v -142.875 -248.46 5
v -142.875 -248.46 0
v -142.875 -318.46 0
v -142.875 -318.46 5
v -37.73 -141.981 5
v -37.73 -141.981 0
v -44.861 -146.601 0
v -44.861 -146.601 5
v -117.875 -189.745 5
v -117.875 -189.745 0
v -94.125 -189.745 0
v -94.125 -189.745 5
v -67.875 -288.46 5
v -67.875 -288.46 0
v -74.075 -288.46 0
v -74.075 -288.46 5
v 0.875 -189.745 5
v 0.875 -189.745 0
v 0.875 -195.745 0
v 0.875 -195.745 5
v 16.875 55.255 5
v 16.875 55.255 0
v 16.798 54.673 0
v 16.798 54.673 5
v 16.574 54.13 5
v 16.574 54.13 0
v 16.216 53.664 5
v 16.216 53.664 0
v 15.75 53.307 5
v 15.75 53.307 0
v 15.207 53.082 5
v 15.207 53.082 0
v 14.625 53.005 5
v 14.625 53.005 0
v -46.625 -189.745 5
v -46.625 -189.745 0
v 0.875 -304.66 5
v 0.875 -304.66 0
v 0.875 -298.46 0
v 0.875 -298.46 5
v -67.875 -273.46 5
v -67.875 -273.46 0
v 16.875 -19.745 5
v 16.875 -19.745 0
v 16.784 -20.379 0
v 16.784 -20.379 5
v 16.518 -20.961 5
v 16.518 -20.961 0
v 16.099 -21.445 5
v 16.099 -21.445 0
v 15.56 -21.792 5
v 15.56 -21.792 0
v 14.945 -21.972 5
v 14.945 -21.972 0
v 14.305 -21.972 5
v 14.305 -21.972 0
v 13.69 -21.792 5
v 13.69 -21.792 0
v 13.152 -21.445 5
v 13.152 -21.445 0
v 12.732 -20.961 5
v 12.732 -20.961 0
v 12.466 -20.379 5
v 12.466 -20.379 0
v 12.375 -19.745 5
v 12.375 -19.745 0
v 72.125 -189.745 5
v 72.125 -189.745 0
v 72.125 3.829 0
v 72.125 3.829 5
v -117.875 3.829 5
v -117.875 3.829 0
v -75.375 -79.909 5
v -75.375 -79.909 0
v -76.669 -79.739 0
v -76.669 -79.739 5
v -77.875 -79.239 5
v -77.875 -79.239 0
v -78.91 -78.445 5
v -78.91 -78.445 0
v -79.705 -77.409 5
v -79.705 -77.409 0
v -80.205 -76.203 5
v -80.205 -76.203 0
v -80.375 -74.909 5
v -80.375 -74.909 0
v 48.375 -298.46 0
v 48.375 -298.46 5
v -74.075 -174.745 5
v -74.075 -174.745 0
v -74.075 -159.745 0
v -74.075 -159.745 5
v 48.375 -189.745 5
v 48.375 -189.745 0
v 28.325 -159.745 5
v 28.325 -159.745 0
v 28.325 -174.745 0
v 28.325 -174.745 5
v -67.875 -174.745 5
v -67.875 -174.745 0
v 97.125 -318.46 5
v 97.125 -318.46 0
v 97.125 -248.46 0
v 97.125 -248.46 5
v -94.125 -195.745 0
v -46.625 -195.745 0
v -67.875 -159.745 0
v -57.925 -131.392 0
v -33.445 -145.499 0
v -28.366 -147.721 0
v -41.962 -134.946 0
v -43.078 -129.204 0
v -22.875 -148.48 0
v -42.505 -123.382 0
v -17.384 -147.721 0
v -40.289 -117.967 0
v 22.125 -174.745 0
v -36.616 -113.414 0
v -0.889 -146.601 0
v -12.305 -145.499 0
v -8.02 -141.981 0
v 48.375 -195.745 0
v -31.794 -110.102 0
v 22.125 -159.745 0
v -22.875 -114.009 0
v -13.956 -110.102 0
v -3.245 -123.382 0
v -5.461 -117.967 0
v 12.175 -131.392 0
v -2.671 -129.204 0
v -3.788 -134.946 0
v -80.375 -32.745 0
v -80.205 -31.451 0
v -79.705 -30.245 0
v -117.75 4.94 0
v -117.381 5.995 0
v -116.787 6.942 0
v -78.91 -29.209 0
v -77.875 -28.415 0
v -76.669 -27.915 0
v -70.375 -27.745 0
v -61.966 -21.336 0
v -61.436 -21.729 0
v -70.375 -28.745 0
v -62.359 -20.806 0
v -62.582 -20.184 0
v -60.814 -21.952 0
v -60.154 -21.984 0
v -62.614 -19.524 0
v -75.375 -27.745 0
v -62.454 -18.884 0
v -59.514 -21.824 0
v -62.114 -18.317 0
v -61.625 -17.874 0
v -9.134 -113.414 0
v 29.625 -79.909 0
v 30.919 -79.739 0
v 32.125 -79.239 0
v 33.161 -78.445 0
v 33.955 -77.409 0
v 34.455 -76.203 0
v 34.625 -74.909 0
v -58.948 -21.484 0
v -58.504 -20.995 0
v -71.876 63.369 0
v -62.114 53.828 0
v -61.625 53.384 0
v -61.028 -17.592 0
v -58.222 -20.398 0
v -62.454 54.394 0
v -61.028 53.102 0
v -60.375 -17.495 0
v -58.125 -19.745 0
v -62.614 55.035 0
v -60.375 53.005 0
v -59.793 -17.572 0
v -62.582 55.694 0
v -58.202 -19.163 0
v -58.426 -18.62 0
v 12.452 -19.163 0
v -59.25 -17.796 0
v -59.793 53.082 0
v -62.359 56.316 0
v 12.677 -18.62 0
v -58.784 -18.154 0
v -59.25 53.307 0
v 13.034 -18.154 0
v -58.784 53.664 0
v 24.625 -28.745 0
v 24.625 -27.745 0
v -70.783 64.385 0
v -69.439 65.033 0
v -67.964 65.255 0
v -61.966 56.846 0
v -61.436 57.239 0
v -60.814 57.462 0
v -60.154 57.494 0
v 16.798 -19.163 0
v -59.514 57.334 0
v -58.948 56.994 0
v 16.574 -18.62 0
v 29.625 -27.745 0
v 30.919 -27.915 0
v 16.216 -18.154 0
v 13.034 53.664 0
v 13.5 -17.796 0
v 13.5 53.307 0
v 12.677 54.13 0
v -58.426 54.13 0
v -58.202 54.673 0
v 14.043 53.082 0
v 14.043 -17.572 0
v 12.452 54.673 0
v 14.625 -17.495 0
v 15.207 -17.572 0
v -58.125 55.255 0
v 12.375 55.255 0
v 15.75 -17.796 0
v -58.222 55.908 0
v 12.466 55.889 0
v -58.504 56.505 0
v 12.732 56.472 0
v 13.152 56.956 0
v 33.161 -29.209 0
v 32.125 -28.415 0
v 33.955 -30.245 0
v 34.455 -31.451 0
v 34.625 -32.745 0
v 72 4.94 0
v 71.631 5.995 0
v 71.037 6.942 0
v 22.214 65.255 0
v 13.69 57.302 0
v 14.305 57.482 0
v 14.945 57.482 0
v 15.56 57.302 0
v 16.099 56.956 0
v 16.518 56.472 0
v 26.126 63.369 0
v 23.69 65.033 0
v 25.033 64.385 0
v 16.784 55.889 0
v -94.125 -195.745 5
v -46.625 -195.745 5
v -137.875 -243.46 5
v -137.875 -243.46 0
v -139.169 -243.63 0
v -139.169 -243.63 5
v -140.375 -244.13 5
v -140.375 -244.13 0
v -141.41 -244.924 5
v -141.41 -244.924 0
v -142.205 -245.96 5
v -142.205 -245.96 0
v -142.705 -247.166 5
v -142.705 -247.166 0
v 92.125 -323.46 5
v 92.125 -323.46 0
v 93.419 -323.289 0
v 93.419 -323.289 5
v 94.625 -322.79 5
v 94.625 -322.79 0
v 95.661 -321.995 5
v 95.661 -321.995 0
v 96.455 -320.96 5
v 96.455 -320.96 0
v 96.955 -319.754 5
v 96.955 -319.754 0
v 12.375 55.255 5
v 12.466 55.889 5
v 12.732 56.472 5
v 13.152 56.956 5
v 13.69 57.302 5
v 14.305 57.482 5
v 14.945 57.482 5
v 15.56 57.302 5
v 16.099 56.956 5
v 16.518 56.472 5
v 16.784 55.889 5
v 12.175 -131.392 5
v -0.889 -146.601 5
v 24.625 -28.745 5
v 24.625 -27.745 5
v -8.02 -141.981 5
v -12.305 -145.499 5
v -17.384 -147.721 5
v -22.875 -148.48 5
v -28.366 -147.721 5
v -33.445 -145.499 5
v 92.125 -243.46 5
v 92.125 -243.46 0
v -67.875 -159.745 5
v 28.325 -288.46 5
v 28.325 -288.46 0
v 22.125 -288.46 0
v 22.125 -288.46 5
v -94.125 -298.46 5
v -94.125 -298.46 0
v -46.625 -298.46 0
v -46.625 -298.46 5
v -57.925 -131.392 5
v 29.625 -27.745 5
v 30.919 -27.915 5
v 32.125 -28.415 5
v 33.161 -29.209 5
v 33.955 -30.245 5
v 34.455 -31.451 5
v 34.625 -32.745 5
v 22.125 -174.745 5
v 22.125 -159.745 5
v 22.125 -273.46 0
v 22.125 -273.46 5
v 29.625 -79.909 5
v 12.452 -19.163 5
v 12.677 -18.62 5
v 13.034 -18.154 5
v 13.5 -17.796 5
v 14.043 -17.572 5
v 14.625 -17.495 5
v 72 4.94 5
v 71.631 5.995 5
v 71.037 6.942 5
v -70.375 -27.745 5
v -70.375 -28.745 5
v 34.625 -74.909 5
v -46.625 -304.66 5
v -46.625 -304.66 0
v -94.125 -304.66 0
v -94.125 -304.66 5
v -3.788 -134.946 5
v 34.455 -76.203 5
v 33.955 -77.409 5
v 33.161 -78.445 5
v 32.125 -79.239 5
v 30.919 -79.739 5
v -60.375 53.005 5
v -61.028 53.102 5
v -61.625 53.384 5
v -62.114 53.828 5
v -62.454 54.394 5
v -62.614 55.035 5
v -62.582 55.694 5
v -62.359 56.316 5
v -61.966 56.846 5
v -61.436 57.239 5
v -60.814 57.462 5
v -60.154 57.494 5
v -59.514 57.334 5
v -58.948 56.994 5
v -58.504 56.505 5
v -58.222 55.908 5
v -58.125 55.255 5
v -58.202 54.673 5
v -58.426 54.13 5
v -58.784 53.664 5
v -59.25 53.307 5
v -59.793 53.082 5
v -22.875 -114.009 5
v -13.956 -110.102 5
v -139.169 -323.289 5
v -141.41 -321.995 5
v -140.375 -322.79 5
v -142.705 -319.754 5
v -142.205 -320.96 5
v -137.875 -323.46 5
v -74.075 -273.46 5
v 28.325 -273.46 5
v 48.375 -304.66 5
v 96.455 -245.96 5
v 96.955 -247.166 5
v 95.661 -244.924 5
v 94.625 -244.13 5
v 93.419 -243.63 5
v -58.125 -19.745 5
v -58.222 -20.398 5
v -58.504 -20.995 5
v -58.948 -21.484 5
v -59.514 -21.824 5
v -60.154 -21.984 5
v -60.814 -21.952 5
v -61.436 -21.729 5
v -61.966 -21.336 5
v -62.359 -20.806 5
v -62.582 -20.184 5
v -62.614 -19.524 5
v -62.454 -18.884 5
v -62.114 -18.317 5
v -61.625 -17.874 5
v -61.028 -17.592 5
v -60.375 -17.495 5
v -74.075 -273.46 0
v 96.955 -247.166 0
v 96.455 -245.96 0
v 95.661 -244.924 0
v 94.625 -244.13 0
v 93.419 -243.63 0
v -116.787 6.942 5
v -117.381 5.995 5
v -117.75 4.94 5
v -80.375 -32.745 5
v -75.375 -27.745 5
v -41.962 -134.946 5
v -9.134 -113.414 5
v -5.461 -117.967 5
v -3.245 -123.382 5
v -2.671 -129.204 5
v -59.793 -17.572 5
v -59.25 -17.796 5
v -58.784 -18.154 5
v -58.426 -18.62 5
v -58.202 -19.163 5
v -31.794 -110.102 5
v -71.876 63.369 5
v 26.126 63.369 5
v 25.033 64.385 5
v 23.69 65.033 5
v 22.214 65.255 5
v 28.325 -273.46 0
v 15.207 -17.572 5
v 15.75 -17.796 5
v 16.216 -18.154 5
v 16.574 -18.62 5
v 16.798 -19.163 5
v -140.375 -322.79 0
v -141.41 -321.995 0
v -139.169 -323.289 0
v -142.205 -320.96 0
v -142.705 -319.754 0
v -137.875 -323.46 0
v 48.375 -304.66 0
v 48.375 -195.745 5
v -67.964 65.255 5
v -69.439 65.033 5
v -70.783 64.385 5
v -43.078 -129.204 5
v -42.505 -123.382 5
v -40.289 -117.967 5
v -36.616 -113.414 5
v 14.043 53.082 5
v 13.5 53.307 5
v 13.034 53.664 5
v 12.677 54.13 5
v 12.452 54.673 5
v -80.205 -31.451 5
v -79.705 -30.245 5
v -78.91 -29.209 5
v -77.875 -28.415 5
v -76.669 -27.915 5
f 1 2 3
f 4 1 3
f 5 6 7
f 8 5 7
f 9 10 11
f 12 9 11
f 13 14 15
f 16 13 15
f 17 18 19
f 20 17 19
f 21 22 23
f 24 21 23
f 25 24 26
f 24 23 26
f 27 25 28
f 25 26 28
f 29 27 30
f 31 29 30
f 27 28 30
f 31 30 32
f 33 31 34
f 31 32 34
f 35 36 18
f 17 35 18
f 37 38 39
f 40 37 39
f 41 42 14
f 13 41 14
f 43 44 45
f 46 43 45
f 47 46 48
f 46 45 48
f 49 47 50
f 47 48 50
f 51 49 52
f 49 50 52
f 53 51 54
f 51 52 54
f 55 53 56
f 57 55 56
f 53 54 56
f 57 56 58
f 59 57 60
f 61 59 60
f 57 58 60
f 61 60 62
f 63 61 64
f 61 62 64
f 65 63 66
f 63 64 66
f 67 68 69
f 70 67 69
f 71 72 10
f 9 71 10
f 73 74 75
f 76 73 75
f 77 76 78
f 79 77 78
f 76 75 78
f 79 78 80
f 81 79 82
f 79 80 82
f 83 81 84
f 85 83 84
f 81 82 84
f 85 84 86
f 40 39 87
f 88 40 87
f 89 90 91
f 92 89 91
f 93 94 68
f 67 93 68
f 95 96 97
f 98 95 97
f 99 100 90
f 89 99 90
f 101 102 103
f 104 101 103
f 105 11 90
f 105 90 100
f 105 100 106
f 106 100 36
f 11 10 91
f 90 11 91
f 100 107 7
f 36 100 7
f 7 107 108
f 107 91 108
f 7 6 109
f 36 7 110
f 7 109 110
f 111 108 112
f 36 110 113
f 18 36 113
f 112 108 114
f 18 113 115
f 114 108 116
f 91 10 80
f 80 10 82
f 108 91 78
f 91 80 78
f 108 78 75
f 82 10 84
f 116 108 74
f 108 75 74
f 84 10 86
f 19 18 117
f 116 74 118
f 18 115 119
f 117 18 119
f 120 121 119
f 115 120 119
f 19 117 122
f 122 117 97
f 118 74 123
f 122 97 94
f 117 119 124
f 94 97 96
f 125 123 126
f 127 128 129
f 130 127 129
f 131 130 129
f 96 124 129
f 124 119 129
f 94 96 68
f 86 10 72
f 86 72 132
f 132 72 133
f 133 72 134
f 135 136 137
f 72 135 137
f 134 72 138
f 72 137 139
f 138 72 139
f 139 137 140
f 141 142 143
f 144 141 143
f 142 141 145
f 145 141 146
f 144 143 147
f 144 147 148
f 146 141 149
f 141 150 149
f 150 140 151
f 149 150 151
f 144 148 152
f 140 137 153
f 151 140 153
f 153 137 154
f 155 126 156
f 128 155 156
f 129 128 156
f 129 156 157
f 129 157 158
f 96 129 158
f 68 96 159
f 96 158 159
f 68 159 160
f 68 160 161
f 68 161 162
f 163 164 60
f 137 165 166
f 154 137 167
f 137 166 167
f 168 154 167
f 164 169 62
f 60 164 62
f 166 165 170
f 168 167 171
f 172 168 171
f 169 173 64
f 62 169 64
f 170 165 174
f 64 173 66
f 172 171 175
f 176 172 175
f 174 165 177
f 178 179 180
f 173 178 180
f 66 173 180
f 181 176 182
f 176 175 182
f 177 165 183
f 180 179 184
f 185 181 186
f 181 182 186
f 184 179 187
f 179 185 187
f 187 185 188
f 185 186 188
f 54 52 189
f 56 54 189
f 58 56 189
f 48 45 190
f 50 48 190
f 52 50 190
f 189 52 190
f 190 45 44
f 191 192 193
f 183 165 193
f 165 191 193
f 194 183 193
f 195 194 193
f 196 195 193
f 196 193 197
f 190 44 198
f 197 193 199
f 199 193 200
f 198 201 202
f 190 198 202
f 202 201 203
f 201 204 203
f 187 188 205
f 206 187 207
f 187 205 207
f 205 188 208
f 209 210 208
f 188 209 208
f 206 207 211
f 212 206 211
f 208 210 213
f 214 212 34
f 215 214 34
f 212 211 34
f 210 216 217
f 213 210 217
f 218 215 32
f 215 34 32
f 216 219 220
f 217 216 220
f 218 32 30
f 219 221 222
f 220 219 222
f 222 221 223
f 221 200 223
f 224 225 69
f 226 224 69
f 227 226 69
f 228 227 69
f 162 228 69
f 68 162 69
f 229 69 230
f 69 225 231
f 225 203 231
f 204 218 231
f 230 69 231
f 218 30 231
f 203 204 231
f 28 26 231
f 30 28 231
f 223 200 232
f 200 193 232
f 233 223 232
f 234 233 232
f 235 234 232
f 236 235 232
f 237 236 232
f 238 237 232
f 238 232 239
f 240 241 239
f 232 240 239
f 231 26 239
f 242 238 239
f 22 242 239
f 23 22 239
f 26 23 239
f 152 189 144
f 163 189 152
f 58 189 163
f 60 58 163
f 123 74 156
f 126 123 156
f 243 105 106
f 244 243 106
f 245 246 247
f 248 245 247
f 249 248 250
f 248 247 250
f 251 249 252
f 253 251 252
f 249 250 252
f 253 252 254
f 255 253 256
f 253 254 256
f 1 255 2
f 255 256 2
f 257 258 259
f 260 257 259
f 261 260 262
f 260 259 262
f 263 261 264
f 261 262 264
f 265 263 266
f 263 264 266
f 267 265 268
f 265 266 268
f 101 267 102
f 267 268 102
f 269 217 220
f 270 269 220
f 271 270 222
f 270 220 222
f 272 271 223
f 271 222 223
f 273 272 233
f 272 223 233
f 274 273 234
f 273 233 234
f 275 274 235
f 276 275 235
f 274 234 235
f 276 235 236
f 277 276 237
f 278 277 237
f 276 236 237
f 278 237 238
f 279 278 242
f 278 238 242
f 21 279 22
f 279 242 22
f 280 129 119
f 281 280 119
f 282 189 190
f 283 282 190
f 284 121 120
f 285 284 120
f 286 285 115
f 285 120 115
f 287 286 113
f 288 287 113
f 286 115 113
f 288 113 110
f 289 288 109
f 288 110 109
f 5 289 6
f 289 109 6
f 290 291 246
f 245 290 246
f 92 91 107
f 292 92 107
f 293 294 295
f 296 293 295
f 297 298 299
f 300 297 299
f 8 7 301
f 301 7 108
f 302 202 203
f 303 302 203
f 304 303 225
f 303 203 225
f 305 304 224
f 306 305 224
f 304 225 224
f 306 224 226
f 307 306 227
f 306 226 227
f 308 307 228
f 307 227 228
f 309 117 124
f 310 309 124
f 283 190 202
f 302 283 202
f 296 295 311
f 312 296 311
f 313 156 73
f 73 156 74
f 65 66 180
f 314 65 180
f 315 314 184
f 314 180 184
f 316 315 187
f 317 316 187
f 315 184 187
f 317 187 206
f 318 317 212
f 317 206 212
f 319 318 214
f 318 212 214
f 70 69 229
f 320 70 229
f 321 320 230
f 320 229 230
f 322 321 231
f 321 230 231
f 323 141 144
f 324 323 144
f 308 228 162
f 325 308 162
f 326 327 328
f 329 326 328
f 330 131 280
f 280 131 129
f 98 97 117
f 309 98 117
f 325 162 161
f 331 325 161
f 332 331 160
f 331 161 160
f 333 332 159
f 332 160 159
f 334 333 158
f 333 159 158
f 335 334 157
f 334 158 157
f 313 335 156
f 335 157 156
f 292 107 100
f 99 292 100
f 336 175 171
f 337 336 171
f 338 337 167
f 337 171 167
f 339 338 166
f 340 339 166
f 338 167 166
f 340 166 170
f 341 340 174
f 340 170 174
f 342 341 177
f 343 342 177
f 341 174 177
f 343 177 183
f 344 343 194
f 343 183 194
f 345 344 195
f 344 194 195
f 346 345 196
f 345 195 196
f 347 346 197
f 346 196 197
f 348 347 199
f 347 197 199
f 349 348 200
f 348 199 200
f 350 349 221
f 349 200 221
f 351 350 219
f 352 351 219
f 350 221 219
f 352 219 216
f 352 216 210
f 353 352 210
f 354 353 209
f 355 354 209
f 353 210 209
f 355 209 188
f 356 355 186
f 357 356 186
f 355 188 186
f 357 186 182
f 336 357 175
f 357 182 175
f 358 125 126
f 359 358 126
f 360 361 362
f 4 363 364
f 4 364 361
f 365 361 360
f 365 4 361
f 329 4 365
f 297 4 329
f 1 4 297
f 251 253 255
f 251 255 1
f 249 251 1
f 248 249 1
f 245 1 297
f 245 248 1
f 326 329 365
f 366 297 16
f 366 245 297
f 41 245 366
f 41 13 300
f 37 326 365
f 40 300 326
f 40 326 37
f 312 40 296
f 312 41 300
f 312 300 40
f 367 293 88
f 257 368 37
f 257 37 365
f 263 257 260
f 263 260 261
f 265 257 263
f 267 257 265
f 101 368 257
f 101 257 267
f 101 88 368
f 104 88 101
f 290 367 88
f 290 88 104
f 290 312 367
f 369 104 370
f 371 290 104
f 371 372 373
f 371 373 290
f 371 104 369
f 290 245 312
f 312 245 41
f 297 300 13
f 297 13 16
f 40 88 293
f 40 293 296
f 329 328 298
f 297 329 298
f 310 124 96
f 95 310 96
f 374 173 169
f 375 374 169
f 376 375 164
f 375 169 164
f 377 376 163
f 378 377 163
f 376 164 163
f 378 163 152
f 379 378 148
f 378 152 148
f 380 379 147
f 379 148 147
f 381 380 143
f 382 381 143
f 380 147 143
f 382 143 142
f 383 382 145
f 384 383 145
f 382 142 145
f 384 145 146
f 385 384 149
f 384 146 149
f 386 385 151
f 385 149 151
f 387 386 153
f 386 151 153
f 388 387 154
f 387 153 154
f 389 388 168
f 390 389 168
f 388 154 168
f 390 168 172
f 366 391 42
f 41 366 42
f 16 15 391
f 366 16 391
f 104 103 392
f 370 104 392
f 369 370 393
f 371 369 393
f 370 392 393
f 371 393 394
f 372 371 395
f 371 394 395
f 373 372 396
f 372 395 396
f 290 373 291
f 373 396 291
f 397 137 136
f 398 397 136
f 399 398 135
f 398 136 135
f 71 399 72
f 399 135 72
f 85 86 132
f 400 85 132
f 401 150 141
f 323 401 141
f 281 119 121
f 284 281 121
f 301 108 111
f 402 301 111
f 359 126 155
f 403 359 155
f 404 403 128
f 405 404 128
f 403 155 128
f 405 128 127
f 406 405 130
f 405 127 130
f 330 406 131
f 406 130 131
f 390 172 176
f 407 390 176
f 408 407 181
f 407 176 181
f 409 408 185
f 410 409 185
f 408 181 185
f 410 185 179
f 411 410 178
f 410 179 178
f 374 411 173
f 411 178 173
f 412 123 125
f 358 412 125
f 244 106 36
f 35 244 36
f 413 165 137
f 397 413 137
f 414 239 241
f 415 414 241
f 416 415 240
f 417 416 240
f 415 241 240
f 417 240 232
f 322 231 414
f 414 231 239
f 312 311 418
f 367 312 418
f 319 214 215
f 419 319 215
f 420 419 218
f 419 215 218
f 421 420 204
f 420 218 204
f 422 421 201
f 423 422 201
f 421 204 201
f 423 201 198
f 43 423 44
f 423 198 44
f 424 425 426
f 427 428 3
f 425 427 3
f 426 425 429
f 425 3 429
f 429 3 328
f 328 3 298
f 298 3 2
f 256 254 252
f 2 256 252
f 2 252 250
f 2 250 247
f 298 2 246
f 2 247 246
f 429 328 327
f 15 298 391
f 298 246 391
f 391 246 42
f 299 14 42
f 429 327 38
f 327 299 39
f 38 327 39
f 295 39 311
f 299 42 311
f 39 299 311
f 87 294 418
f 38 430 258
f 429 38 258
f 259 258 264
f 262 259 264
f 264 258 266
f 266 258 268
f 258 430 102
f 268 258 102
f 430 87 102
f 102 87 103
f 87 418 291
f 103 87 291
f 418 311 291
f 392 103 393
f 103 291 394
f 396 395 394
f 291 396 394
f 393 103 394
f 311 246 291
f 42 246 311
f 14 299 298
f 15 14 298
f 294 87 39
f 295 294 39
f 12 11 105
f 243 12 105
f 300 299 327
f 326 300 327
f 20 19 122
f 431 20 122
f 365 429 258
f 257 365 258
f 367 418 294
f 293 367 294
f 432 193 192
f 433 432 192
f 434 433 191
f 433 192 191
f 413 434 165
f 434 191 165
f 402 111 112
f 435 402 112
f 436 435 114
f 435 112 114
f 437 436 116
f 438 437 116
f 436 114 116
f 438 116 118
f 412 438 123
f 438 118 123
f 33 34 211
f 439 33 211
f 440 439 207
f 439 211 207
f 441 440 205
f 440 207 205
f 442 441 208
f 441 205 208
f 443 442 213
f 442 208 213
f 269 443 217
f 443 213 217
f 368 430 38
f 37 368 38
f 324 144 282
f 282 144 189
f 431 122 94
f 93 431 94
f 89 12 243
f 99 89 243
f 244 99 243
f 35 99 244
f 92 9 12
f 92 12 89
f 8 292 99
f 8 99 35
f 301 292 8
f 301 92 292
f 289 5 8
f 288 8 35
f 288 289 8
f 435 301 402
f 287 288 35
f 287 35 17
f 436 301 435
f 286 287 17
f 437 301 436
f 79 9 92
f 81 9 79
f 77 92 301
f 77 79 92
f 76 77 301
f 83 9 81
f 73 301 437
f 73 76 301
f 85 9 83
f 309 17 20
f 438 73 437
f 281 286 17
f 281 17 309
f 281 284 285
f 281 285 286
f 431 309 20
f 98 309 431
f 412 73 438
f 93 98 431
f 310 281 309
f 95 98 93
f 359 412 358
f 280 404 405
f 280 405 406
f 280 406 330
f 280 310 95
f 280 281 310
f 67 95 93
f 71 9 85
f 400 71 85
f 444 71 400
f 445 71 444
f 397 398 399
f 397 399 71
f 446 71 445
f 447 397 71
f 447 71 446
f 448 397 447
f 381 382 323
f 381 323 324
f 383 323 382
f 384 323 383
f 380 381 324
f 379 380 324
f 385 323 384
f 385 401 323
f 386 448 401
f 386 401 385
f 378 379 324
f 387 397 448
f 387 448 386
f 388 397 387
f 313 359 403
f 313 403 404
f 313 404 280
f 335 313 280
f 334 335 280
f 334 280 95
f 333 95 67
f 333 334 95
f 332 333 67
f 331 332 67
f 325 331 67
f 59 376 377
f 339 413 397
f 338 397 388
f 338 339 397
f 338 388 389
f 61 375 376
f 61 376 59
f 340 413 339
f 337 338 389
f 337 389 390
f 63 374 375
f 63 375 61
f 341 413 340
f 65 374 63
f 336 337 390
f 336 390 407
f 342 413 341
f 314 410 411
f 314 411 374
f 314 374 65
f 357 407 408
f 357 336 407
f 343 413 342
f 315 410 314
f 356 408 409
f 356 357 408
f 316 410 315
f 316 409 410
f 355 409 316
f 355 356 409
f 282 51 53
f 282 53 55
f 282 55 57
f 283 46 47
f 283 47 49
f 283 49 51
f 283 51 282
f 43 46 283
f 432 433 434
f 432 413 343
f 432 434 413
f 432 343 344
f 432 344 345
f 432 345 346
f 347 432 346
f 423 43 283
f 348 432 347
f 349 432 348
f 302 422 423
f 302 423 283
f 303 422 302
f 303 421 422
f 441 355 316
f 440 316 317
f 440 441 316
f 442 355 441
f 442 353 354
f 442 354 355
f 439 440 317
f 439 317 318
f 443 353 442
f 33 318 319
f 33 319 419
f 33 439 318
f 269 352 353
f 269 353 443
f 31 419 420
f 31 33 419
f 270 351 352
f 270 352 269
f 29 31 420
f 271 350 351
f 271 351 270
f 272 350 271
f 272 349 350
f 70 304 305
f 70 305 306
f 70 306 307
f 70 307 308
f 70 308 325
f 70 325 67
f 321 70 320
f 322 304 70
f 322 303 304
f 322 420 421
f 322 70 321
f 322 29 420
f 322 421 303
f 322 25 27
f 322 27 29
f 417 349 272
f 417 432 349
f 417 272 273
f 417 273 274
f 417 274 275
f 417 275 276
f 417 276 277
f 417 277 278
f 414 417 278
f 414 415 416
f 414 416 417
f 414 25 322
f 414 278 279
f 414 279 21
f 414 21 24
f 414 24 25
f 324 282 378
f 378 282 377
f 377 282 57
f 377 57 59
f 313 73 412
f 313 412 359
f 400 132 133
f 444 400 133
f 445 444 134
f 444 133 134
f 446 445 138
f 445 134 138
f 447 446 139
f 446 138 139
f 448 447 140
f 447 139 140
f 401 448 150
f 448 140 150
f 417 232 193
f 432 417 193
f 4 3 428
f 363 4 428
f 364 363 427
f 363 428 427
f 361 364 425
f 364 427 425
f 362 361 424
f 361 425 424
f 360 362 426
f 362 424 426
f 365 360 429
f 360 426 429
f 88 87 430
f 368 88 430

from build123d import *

# Parameters (mm, degrees)
F1_DEPTH = 5


with BuildPart() as f1:
    # F0 (on Top) → F1 (new body)
    with BuildSketch(Plane.XY):
        with BuildLine():
            Line((92.1250784397, -243.4596419334), (-22.8749215603, -243.4596419334))
            Line((-22.8749215603, -243.4596419334), (-137.8749215603, -243.4596419334))
            ThreePointArc((-137.8749215603, -243.4596419334), (-141.4104554662, -244.9241080275), (-142.8749215603, -248.4596419334))
            Line((-142.8749215603, -248.4596419334), (-142.8749215603, -283.4596419334))
            Line((-142.8749215603, -283.4596419334), (-142.8749215603, -298.4596419334))
            Line((-142.8749215603, -298.4596419334), (-142.8749215603, -318.4596419334))
            ThreePointArc((-142.8749215603, -318.4596419334), (-141.4104554662, -321.9951758394), (-137.8749215603, -323.4596419334))
            Line((-137.8749215603, -323.4596419334), (92.1250784397, -323.4596419334))
            ThreePointArc((92.1250784397, -323.4596419334), (95.6606123456, -321.9951758394), (97.1250784397, -318.4596419334))
            Line((97.1250784397, -318.4596419334), (97.1250784397, -248.4596419334))
            ThreePointArc((97.1250784397, -248.4596419334), (95.6606123456, -244.9241080275), (92.1250784397, -243.4596419334))
        make_face()
        Polygon((-94.1249215603, -303.4596419334), (-94.1249215603, -298.4596419334), (-46.6249215603, -298.4596419334), (-46.6249215603, -303.4596419334), (-46.6249215603, -304.6596419334), (-94.1249215603, -304.6596419334), align=None, mode=Mode.SUBTRACT)
        Polygon((-72.8749215603, -273.4596419334), (-70.3749215603, -273.4596419334), (-67.8749215603, -273.4596419334), (-67.8749215603, -288.4596419334), (-72.8749215603, -288.4596419334), (-74.0749215603, -288.4596419334), (-74.0749215603, -273.4596419334), align=None, mode=Mode.SUBTRACT)
        Polygon((0.8750784397, -304.6596419334), (0.8750784397, -303.4596419334), (0.8750784397, -298.4596419334), (48.3750784397, -298.4596419334), (48.3750784397, -303.4596419334), (48.3750784397, -304.6596419334), align=None, mode=Mode.SUBTRACT)
        Polygon((22.1250784397, -273.4596419334), (24.6250784397, -273.4596419334), (27.1250784397, -273.4596419334), (28.3250784397, -273.4596419334), (28.3250784397, -288.4596419334), (27.1250784397, -288.4596419334), (22.1250784397, -288.4596419334), align=None, mode=Mode.SUBTRACT)
    extrude(amount=F1_DEPTH)


with BuildPart() as f1b:
    # F0 (on Top) → F1, piece 2 (new body)
    with BuildSketch(Plane.XY):
        with BuildLine():
            Line((14.6250784397, 65.2551365197), (-60.3749215603, 65.2551365197))
            Line((-60.3749215603, 65.2551365197), (-67.9641170056, 65.2551365197))
            ThreePointArc((-67.9641170056, 65.2551365197), (-70.135678908, 64.758948117), (-71.8762392778, 63.3688640813))
            Line((-71.8762392778, 63.3688640813), (-116.7870438325, 6.9424249383))
            ThreePointArc((-116.7870438325, 6.9424249383), (-117.5951234289, 5.4778469514), (-117.8749215603, 3.8286973767))
            Line((-117.8749215603, 3.8286973767), (-117.8749215603, -52.7448634803))
            Line((-117.8749215603, -52.7448634803), (-117.8749215603, -189.7448634803))
            Line((-117.8749215603, -189.7448634803), (-94.1249215603, -189.7448634803))
            Line((-94.1249215603, -189.7448634803), (-94.1249215603, -194.7448634803))
            Line((-94.1249215603, -194.7448634803), (-94.1249215603, -195.7448634803))
            Line((-94.1249215603, -195.7448634803), (-46.6249215603, -195.7448634803))
            Line((-46.6249215603, -195.7448634803), (-46.6249215603, -194.7448634803))
            Line((-46.6249215603, -194.7448634803), (-46.6249215603, -189.7448634803))
            Line((-46.6249215603, -189.7448634803), (-22.8749215603, -189.7448634803))
            Line((-22.8749215603, -189.7448634803), (0.8750784397, -189.7448634803))
            Line((0.8750784397, -189.7448634803), (0.8750784397, -194.7448634803))
            Line((0.8750784397, -194.7448634803), (0.8750784397, -195.7448634803))
            Line((0.8750784397, -195.7448634803), (48.3750784397, -195.7448634803))
            Line((48.3750784397, -195.7448634803), (48.3750784397, -194.7448634803))
            Line((48.3750784397, -194.7448634803), (48.3750784397, -189.7448634803))
            Line((48.3750784397, -189.7448634803), (72.1250784397, -189.7448634803))
            Line((72.1250784397, -189.7448634803), (72.1250784397, -52.7448634803))
            Line((72.1250784397, -52.7448634803), (72.1250784397, 3.8286973767))
            ThreePointArc((72.1250784397, 3.8286973767), (71.8452803083, 5.4778469514), (71.0372007119, 6.9424249383))
            Line((71.0372007119, 6.9424249383), (26.1263961572, 63.3688640813))
            ThreePointArc((26.1263961572, 63.3688640813), (24.3858357875, 64.758948117), (22.214273885, 65.2551365197))
            Line((22.214273885, 65.2551365197), (14.6250784397, 65.2551365197))
        make_face()
        Polygon((-72.8749215603, -159.7448634803), (-70.3749215603, -159.7448634803), (-67.8749215603, -159.7448634803), (-67.8749215603, -174.7448634803), (-72.8749215603, -174.7448634803), (-74.0749215603, -174.7448634803), (-74.0749215603, -159.7448634803), align=None, mode=Mode.SUBTRACT)
        Polygon((22.1250784397, -159.7448634803), (24.6250784397, -159.7448634803), (27.1250784397, -159.7448634803), (28.3250784397, -159.7448634803), (28.3250784397, -174.7448634803), (27.1250784397, -174.7448634803), (22.1250784397, -174.7448634803), align=None, mode=Mode.SUBTRACT)
        with BuildLine():
            ThreePointArc((-41.9616178547, -134.9464001798), (-41.5936592763, -120.5938582844), (-31.7935436802, -110.1015474486))
            Line((-31.7935436802, -110.1015474486), (-22.8749215603, -114.0089929104))
            Line((-22.8749215603, -114.0089929104), (-13.9562994404, -110.1015474486))
            ThreePointArc((-13.9562994404, -110.1015474486), (-4.1561838443, -120.5938582844), (-3.7882252659, -134.9464001798))
            Line((-3.7882252659, -134.9464001798), (12.1750198305, -131.392210722))
            Line((12.1750198305, -131.392210722), (-0.8886083961, -146.6006189585))
            Line((-0.8886083961, -146.6006189585), (-8.0198945936, -141.9809370457))
            ThreePointArc((-8.0198945936, -141.9809370457), (-22.8749215603, -148.4804743528), (-37.729948527, -141.9809370457))
            Line((-37.729948527, -141.9809370457), (-44.8612347245, -146.6006189585))
            Line((-44.8612347245, -146.6006189585), (-57.924862951, -131.392210722))
            Line((-57.924862951, -131.392210722), (-41.9616178547, -134.9464001798))
        make_face(mode=Mode.SUBTRACT)
        with BuildLine():
            ThreePointArc((-60.3749215603, -17.4948634803), (-58.7839313026, -18.1538732226), (-58.1249215603, -19.7448634803))
            ThreePointArc((-58.1249215603, -19.7448634803), (-61.965911818, -21.3358537379), (-60.3749215603, -17.4948634803))
        make_face(mode=Mode.SUBTRACT)
        with BuildLine():
            ThreePointArc((-60.3749215603, 53.0051365197), (-61.965911818, 56.8461267774), (-58.1249215603, 55.2551365197))
            ThreePointArc((-58.1249215603, 55.2551365197), (-58.7839313026, 53.6641462621), (-60.3749215603, 53.0051365197))
        make_face(mode=Mode.SUBTRACT)
        with BuildLine():
            Line((-80.3749215603, -74.9092054367), (-80.3749215603, -52.7448634803))
            Line((-80.3749215603, -52.7448634803), (-80.3749215603, -32.7448634803))
            ThreePointArc((-80.3749215603, -32.7448634803), (-78.9104554662, -29.2093295743), (-75.3749215603, -27.7448634803))
            Line((-75.3749215603, -27.7448634803), (-70.3749215603, -27.7448634803))
            Line((-70.3749215603, -27.7448634803), (-70.3749215603, -28.7448634803))
            Line((-70.3749215603, -28.7448634803), (24.6250784397, -28.7448634803))
            Line((24.6250784397, -28.7448634803), (24.6250784397, -27.7448634803))
            Line((24.6250784397, -27.7448634803), (29.6250784397, -27.7448634803))
            ThreePointArc((29.6250784397, -27.7448634803), (33.1606123456, -29.2093295743), (34.6250784397, -32.7448634803))
            Line((34.6250784397, -32.7448634803), (34.6250784397, -74.9092054367))
            ThreePointArc((34.6250784397, -74.9092054367), (33.1606123456, -78.4447393426), (29.6250784397, -79.9092054367))
            Line((29.6250784397, -79.9092054367), (-75.3749215603, -79.9092054367))
            ThreePointArc((-75.3749215603, -79.9092054367), (-78.9104554662, -78.4447393426), (-80.3749215603, -74.9092054367))
        make_face(mode=Mode.SUBTRACT)
        with BuildLine():
            ThreePointArc((14.6250784397, -17.4948634803), (16.2160686974, -18.1538732226), (16.8750784397, -19.7448634803))
            ThreePointArc((16.8750784397, -19.7448634803), (14.6250784397, -21.9948634803), (12.3750784397, -19.7448634803))
            ThreePointArc((12.3750784397, -19.7448634803), (13.034088182, -18.1538732226), (14.6250784397, -17.4948634803))
        make_face(mode=Mode.SUBTRACT)
        with BuildLine():
            ThreePointArc((16.8750784397, 55.2551365197), (16.2160686974, 53.6641462621), (14.6250784397, 53.0051365197))
            ThreePointArc((14.6250784397, 53.0051365197), (13.034088182, 53.6641462621), (12.3750784397, 55.2551365197))
            ThreePointArc((12.3750784397, 55.2551365197), (14.6250784397, 57.5051365197), (16.8750784397, 55.2551365197))
        make_face(mode=Mode.SUBTRACT)
    extrude(amount=F1_DEPTH)


solid = Compound([f1.part, f1b.part])
